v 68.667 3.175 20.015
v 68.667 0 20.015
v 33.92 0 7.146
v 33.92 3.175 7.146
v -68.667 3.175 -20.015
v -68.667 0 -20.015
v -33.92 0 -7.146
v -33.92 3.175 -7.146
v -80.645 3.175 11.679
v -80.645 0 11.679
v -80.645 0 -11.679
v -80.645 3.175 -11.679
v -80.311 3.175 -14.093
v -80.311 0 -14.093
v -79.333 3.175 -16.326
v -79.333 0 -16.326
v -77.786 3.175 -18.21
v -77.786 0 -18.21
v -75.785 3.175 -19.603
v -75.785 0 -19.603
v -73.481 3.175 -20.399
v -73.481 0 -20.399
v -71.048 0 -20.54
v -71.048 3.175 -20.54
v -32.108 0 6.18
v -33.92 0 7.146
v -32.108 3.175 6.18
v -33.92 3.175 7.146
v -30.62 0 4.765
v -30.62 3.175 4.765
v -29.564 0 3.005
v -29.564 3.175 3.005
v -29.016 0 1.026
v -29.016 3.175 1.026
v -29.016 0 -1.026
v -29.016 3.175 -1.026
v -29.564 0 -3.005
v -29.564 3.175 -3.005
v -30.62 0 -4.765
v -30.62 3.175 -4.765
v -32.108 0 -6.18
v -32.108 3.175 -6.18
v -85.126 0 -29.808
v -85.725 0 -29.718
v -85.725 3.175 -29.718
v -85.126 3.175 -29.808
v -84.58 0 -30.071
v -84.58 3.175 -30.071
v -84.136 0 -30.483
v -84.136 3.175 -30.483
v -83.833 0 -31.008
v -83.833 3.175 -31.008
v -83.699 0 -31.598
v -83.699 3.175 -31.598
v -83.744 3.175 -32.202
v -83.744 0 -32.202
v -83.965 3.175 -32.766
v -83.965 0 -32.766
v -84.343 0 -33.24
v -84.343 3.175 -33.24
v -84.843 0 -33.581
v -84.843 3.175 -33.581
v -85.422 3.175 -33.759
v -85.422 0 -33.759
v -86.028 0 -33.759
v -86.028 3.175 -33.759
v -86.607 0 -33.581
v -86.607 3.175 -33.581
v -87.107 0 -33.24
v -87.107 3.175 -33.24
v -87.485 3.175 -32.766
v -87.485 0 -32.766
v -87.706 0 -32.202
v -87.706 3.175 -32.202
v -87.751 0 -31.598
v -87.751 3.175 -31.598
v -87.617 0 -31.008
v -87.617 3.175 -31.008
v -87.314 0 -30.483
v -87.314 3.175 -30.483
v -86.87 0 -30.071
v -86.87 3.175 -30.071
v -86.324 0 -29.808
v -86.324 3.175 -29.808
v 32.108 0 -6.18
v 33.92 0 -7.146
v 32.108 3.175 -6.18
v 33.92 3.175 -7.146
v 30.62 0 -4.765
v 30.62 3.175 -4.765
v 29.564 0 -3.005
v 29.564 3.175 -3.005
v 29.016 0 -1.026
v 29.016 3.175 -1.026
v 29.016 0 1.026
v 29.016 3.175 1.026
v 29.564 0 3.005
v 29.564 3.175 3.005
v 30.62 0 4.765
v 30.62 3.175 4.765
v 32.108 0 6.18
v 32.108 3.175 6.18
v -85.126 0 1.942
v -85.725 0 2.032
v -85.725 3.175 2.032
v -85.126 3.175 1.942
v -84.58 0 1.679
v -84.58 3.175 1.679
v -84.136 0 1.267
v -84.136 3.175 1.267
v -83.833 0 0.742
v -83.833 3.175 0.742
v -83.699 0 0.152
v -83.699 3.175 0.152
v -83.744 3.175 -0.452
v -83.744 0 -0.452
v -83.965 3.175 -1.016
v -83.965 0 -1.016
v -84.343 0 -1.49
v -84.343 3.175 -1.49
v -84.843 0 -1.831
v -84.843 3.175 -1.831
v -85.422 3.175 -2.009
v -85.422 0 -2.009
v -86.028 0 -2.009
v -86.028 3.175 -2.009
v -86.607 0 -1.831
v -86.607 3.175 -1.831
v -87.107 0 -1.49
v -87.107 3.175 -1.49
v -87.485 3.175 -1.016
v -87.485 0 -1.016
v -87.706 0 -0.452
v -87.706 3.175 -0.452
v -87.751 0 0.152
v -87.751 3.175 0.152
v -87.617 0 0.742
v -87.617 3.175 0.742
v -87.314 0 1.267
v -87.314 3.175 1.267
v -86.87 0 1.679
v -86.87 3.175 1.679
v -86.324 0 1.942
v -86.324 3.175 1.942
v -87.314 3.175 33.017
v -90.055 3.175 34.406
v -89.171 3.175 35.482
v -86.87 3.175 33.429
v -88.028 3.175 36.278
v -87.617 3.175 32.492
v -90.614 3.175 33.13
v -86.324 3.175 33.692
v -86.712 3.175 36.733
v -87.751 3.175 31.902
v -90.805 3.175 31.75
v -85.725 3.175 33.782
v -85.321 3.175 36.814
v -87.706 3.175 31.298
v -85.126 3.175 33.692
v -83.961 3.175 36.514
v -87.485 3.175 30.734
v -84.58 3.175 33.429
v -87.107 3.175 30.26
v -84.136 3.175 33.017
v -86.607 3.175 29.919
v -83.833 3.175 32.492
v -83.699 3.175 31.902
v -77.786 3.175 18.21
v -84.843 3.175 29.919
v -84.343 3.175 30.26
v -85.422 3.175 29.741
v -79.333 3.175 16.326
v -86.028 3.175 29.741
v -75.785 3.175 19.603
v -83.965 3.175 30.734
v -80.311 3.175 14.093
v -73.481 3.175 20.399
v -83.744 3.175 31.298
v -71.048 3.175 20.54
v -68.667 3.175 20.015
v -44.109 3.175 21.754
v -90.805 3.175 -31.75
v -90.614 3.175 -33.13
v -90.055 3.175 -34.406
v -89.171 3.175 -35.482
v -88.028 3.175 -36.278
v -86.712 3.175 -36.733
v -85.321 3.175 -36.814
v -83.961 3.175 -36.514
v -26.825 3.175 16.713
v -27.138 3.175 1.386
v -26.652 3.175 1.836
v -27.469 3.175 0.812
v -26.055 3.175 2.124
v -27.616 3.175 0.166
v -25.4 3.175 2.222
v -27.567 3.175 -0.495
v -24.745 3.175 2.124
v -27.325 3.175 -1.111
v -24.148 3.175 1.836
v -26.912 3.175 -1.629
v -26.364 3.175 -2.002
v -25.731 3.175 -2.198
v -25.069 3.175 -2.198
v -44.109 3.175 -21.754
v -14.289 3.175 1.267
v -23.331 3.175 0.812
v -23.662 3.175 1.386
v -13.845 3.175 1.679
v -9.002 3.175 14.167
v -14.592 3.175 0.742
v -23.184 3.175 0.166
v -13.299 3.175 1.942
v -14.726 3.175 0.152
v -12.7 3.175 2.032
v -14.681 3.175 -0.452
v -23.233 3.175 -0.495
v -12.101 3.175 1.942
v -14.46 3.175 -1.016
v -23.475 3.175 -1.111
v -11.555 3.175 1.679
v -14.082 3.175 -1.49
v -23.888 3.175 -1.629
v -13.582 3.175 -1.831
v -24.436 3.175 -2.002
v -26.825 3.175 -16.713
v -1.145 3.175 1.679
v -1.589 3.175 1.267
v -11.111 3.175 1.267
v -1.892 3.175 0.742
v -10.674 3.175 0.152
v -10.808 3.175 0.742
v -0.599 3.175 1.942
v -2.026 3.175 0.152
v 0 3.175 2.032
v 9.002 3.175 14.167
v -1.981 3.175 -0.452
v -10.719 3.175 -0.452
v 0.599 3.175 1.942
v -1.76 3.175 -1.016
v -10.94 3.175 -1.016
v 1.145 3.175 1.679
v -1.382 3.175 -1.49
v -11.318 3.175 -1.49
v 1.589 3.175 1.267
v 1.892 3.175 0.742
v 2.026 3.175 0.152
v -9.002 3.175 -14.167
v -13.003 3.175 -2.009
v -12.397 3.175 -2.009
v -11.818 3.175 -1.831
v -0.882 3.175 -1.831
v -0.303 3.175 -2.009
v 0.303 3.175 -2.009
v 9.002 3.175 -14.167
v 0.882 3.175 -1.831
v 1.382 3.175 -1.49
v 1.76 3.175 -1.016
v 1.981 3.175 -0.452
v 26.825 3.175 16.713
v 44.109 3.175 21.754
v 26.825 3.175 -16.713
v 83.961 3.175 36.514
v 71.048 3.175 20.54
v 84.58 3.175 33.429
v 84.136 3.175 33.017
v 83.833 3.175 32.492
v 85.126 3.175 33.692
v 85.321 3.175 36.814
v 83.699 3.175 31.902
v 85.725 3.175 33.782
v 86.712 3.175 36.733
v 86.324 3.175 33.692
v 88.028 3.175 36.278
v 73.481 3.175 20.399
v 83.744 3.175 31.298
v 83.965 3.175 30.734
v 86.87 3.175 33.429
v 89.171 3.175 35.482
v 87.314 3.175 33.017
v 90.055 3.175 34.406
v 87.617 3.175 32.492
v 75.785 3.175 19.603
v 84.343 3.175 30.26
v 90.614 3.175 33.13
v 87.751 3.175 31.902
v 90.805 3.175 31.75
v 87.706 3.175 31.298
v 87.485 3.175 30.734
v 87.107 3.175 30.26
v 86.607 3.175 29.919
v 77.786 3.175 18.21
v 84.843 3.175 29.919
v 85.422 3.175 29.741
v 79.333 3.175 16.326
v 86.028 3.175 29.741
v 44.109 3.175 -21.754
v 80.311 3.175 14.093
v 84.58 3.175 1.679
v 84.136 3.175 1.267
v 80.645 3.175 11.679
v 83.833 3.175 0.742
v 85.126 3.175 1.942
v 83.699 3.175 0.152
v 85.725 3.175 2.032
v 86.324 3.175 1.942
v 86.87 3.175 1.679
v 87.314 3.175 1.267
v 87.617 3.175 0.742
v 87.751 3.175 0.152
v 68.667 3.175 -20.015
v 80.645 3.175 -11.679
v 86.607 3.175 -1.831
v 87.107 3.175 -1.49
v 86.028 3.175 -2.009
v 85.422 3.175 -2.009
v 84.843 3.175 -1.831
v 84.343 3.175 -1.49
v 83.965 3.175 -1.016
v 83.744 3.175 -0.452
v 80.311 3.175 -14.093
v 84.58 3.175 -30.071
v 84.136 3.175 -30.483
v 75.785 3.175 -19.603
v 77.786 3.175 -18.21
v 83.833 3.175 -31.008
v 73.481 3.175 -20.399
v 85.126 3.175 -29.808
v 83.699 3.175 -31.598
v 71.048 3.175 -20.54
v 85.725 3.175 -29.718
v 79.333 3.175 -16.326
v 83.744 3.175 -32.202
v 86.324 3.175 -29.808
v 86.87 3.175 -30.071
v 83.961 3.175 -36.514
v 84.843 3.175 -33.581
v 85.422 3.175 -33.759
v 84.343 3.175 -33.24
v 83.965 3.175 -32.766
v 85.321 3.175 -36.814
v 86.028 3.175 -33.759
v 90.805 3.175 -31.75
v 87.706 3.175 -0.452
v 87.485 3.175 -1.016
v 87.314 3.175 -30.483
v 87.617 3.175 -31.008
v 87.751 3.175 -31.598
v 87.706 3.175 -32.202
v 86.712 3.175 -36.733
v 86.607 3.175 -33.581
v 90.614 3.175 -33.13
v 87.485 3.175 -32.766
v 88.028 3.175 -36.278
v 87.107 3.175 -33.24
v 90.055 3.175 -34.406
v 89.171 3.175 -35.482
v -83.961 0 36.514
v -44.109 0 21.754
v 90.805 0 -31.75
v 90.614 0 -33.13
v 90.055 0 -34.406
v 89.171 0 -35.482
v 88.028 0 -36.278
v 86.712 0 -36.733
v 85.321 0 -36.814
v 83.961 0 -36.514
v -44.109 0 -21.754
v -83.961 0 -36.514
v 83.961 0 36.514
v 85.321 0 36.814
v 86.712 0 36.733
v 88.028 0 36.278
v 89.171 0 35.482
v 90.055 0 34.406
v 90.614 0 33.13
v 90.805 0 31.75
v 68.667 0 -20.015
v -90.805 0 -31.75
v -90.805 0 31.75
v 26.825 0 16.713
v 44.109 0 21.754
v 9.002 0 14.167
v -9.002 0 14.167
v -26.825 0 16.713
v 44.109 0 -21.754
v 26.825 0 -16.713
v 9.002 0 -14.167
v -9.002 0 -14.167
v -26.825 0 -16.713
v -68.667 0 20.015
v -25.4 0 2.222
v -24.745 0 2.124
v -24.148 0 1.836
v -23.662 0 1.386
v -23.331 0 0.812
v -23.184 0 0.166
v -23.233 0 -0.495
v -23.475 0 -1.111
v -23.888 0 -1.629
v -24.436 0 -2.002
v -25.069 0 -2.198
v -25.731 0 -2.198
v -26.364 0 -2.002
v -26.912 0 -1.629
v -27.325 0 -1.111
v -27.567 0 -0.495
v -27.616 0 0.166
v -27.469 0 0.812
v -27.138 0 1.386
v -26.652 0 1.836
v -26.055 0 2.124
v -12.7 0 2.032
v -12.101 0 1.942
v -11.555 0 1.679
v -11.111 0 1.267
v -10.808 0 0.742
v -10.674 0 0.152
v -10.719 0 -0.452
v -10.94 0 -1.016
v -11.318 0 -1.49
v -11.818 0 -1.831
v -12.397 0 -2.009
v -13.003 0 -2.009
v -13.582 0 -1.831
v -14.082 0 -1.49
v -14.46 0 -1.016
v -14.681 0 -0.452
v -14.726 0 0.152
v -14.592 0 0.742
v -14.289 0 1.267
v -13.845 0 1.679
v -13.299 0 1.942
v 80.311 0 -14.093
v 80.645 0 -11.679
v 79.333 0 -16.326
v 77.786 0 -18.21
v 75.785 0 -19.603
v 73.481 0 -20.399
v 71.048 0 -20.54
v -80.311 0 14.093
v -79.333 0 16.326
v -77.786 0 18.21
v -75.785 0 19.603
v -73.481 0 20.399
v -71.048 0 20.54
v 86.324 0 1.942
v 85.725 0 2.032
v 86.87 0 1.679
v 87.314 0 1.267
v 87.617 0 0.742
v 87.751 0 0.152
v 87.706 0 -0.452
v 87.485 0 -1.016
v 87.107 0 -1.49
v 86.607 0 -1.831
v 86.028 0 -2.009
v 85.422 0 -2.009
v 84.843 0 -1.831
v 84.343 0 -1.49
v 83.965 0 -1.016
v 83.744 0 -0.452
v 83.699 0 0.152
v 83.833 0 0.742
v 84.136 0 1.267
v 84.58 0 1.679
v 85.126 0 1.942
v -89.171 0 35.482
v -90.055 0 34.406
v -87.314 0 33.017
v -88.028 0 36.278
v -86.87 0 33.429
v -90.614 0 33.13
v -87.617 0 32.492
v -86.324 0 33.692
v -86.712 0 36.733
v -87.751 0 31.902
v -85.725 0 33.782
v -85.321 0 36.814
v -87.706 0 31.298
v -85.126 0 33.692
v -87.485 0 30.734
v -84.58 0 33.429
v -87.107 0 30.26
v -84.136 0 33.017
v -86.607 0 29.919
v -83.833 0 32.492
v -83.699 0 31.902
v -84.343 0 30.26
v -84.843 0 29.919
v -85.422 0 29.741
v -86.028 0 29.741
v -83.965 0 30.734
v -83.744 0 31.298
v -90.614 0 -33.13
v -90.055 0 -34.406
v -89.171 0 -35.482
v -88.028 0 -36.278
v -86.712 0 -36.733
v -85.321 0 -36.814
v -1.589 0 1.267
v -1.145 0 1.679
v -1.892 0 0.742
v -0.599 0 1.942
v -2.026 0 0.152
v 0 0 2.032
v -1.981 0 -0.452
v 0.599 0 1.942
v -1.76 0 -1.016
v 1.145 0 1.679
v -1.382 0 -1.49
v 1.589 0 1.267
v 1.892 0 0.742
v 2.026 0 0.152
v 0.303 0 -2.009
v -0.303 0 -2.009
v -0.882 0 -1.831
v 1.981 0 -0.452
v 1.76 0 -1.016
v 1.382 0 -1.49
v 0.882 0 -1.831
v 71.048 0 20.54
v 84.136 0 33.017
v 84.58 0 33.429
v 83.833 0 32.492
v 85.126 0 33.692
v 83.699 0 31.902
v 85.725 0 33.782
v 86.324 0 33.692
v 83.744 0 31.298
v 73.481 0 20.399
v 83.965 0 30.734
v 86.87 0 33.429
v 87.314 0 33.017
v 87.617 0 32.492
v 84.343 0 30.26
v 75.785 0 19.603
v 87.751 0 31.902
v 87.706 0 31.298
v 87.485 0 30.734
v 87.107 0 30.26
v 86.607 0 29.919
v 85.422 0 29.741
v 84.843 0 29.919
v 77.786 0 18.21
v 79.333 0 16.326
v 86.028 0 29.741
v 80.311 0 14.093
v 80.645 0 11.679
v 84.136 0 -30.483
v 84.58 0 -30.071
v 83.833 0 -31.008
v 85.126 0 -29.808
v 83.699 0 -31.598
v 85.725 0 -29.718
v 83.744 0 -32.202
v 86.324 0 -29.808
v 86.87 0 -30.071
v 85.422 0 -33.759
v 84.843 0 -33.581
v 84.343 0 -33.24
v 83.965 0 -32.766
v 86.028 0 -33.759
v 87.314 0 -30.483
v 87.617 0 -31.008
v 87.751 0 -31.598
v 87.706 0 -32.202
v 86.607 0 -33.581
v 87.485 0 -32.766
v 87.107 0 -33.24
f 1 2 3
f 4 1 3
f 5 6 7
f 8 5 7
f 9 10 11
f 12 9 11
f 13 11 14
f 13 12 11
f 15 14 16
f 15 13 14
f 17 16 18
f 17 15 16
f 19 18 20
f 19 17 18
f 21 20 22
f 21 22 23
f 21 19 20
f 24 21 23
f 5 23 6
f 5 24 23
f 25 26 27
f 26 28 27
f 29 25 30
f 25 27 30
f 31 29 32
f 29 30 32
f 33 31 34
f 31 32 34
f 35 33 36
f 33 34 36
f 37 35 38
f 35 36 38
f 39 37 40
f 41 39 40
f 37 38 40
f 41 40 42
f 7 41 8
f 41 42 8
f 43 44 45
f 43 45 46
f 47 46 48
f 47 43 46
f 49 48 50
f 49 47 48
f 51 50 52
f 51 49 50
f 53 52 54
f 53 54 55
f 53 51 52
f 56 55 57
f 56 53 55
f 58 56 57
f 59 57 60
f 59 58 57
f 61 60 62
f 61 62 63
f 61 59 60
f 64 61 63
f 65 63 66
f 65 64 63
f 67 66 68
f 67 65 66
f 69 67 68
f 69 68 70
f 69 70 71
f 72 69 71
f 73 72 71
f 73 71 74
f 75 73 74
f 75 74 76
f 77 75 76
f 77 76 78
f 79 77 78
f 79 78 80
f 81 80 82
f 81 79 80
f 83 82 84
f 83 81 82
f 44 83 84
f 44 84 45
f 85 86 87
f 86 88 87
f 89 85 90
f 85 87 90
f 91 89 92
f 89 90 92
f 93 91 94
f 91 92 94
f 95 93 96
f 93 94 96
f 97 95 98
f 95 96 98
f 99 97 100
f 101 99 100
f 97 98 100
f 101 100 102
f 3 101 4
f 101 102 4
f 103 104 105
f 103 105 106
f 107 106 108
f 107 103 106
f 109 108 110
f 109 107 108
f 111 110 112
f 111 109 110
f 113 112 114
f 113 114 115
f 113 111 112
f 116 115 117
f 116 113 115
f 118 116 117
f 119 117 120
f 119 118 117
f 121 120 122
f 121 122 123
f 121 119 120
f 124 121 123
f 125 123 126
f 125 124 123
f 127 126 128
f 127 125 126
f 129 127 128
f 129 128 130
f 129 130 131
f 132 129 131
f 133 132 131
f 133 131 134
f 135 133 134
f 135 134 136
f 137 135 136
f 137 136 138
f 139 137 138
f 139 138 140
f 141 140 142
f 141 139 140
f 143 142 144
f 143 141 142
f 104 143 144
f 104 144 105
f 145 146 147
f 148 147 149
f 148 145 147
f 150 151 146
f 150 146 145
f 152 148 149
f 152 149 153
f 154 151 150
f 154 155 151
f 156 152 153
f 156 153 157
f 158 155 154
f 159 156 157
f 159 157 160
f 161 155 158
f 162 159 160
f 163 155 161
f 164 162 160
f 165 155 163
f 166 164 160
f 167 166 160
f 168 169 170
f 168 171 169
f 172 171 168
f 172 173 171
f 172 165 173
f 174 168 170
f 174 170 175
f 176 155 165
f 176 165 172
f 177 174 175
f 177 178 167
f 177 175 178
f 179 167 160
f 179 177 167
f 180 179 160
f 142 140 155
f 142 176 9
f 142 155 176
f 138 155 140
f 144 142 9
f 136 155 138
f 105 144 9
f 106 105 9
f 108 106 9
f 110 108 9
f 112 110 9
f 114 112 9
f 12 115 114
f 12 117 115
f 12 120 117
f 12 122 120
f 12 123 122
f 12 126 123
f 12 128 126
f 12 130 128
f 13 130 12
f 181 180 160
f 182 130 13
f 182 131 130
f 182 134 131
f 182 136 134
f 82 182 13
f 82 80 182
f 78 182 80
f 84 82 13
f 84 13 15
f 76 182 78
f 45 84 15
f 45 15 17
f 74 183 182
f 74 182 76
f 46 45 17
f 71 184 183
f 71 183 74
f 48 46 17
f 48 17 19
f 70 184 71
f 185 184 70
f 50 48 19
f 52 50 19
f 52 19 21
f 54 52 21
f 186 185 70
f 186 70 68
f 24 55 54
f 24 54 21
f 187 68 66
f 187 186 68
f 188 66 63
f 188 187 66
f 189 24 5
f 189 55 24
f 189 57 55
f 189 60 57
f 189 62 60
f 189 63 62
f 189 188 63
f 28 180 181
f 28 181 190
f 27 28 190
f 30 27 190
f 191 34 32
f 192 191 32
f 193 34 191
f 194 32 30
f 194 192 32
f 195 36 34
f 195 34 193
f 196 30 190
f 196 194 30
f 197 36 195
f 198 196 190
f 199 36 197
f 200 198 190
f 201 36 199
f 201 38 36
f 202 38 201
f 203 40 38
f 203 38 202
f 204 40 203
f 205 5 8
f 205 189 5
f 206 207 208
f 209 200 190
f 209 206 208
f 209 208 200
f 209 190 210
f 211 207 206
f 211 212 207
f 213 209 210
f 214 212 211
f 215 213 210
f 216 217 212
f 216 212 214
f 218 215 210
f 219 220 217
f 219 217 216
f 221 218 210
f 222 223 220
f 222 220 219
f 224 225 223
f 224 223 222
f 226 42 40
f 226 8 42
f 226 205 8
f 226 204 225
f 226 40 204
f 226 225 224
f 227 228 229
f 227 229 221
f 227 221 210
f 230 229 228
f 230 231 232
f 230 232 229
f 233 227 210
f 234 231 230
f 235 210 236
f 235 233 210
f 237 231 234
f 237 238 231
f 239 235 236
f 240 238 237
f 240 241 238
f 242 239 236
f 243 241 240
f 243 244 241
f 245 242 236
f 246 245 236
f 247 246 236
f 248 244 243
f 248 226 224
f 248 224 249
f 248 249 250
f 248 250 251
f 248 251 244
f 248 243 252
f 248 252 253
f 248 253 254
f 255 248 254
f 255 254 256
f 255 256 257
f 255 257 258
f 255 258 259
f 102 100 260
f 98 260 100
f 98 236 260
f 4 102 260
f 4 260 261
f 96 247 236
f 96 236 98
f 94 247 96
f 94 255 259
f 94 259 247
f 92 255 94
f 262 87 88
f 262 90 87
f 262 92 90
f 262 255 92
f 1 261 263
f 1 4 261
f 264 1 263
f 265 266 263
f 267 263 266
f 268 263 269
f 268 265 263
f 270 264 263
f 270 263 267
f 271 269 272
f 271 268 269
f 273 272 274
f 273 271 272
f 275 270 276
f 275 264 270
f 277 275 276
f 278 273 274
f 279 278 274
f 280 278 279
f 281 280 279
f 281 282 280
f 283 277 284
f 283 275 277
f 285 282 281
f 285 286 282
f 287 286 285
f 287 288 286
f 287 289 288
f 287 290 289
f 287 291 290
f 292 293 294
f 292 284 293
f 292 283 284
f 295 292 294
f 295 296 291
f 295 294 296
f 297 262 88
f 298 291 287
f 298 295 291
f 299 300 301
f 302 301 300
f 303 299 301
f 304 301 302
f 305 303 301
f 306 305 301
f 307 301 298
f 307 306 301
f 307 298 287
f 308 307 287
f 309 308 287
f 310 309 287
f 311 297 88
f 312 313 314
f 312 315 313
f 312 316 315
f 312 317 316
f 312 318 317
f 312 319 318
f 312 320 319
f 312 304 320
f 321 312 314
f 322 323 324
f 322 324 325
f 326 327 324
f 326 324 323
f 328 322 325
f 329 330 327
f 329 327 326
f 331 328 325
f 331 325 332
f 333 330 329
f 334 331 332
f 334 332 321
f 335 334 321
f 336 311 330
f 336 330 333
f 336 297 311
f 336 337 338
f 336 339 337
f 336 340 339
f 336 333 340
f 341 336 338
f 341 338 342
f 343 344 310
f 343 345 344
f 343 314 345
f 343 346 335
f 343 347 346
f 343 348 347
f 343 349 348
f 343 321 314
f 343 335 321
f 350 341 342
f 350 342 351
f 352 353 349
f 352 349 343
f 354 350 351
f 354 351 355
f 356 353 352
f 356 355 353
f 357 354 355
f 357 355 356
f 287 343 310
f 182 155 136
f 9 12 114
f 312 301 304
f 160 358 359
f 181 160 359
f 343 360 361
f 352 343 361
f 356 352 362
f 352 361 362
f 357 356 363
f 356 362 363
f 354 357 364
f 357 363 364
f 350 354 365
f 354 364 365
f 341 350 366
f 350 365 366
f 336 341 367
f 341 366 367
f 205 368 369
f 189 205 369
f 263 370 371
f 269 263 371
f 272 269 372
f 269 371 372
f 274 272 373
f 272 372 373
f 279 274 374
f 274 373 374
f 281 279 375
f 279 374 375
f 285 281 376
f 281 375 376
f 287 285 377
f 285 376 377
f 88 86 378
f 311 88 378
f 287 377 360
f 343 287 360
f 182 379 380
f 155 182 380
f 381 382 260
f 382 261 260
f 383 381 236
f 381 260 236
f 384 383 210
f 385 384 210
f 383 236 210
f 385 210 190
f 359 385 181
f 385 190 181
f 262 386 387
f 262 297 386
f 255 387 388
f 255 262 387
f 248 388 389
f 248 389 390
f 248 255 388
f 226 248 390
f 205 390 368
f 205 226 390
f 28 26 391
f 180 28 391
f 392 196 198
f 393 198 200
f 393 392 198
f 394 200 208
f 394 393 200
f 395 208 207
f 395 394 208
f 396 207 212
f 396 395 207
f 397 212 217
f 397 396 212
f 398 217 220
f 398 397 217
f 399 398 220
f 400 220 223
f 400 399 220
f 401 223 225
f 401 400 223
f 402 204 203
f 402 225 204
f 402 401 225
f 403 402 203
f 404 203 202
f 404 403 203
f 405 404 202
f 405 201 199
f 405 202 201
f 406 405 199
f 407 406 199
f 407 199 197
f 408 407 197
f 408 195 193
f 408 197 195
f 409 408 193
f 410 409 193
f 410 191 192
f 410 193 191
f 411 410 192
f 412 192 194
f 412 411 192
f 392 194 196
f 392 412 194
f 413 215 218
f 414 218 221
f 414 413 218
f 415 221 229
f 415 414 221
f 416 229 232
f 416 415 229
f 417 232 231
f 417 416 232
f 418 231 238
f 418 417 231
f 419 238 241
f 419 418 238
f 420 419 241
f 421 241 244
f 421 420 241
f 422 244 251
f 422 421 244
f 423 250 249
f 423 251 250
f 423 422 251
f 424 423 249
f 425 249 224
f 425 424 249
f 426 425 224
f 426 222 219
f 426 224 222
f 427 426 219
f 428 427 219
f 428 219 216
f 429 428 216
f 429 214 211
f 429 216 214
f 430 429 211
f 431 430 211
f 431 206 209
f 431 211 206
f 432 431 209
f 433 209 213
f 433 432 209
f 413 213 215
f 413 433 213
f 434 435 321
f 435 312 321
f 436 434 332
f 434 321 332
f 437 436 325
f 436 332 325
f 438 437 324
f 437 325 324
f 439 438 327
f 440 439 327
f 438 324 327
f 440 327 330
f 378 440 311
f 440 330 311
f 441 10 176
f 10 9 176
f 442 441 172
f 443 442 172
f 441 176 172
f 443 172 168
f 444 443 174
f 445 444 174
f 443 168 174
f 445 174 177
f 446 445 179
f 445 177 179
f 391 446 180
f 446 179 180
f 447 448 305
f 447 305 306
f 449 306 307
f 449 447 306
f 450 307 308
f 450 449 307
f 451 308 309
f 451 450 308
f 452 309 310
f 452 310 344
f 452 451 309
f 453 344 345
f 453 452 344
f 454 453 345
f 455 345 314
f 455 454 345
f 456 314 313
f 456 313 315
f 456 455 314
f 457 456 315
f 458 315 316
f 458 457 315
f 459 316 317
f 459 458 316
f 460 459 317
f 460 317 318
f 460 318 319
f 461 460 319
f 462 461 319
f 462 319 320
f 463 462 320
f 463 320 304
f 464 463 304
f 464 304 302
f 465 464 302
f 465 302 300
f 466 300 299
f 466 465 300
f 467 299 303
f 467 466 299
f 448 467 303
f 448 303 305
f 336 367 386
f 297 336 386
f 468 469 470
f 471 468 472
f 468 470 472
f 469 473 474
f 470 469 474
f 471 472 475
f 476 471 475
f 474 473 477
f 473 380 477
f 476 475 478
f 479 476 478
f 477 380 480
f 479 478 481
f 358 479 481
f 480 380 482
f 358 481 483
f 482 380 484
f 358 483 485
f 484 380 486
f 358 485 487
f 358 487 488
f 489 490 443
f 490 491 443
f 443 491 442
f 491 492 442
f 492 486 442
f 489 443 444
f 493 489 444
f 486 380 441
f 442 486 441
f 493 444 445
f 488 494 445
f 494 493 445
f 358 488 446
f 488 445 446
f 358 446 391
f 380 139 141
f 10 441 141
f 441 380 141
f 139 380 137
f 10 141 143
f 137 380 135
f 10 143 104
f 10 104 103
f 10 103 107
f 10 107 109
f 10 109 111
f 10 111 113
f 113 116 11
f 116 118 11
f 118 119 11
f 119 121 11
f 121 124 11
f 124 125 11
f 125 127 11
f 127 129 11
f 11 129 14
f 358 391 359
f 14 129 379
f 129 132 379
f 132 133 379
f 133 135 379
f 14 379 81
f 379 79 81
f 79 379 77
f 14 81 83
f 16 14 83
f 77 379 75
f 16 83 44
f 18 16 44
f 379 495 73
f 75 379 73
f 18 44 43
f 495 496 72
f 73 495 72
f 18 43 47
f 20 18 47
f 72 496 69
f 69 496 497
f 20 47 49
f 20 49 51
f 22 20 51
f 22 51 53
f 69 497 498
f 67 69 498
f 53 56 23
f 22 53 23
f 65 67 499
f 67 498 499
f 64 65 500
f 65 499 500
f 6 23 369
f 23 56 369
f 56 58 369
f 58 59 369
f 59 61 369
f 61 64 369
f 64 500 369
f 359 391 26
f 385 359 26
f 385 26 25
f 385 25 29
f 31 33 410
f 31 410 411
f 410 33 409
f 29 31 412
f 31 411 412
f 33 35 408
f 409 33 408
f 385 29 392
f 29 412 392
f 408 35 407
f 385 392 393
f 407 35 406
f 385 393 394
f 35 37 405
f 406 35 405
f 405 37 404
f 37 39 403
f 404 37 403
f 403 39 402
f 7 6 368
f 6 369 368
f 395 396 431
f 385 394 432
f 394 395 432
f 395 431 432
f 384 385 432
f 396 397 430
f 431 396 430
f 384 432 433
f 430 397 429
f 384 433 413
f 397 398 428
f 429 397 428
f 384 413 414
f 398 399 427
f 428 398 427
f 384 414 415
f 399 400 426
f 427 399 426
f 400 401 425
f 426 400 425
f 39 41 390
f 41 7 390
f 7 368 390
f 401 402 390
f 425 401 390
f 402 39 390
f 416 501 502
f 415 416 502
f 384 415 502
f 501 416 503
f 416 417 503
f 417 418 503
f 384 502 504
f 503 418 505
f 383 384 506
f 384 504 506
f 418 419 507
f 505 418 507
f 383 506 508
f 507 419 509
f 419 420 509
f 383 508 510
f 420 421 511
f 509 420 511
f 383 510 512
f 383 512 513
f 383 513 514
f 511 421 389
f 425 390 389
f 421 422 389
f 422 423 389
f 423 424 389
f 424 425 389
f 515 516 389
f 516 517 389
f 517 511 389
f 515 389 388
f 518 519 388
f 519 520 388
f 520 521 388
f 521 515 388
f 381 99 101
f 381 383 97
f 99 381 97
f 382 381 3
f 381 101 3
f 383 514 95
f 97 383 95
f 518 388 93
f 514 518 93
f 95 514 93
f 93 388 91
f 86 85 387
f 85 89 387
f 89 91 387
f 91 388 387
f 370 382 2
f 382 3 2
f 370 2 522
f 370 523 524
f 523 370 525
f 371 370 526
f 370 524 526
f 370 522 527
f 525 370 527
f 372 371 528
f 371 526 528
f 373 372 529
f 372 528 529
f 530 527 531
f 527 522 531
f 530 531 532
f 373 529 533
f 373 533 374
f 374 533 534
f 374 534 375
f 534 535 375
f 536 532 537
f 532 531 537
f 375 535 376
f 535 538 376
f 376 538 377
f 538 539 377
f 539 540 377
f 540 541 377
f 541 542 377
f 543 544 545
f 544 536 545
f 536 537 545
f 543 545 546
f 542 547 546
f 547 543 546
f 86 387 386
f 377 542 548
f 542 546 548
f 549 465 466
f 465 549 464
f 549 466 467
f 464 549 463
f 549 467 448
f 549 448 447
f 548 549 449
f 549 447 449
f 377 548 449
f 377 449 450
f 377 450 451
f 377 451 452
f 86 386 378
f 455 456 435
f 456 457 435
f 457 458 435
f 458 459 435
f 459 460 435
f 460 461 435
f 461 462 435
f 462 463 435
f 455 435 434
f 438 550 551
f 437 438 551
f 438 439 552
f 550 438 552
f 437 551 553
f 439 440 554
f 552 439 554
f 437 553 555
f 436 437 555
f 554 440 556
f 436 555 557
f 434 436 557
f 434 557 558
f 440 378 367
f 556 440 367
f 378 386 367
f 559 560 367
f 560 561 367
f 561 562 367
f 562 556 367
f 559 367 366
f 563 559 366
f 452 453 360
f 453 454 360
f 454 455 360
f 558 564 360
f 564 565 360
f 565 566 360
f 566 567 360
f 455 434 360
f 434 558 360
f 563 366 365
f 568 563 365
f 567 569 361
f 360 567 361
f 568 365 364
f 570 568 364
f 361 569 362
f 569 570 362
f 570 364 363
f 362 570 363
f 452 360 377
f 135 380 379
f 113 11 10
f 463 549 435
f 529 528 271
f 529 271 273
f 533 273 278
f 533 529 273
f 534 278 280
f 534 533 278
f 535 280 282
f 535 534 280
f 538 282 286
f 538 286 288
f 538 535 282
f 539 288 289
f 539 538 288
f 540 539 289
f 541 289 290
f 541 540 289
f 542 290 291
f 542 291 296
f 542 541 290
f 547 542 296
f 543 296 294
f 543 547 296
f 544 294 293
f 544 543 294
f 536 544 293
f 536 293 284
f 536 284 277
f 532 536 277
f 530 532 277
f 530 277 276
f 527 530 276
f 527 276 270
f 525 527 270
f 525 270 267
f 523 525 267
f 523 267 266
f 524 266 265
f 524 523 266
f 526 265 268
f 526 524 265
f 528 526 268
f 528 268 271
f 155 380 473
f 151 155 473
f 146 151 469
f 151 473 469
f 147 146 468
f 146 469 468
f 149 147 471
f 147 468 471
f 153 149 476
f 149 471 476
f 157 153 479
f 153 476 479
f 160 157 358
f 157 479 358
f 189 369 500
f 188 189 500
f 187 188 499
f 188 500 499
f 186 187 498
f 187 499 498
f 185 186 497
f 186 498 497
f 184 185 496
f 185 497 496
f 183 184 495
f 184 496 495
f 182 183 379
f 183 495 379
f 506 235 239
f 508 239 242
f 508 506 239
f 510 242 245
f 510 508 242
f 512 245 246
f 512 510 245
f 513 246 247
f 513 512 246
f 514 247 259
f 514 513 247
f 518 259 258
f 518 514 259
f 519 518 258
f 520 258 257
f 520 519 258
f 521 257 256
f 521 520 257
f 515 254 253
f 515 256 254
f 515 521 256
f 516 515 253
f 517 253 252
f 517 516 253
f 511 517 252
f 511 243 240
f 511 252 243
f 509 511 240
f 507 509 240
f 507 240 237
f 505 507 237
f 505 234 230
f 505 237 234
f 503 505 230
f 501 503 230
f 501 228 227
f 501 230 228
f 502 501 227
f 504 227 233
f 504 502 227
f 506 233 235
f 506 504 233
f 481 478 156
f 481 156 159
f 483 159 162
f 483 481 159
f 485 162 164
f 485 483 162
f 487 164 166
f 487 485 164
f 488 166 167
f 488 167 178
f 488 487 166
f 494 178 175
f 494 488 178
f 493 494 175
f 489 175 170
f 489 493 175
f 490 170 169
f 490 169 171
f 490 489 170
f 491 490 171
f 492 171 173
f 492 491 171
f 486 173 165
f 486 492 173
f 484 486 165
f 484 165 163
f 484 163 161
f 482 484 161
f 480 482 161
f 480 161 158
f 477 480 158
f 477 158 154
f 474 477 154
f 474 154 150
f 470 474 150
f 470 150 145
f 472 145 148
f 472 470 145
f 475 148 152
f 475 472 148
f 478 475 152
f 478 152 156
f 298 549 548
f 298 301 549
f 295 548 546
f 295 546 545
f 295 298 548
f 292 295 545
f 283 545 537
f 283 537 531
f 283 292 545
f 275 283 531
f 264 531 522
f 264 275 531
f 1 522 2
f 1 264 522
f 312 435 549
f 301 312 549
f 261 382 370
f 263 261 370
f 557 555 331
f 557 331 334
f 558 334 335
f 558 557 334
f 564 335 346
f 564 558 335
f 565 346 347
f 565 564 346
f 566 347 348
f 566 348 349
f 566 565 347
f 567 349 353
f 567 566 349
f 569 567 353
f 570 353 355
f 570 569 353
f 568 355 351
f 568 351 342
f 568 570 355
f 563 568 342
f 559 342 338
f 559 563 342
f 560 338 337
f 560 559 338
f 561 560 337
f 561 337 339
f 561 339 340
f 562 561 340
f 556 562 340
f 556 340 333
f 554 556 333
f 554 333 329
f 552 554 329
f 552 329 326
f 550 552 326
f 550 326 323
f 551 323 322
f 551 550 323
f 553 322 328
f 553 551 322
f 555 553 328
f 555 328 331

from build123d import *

# Parameters (mm, degrees)
SKETCH1_R           = 2.032
BOSS_EXTRUDE1_DEPTH = 3.175
FILLET1_R           = 8.89
FILLET2_R           = 7.62
FILLET3_R           = 127
SKETCH1_3_R         = 2.032
SKETCH1_3_R_2       = 2.2225
CUT_EXTRUDE1_DEPTH  = 99.041203328


with BuildPart() as part:
    # Sketch1 → Boss-Extrude1 (new body)
    with BuildSketch(Plane(origin=(0, 0, 0), x_dir=(1, 0, 0), z_dir=(0, 1, 0))):
        with BuildLine():
            Line((90.805, -31.75), (90.805, 31.75))
            ThreePointArc((90.805, 31.75), (88.627022296, 35.919492367), (83.960643072, 36.513763704))
            Line((83.960643072, 36.513763704), (0, 5.417229233))
            Line((0, 5.417229233), (-83.960643072, 36.513763704))
            ThreePointArc((-83.960643072, 36.513763704), (-88.627022296, 35.919492367), (-90.805, 31.75))
            Line((-90.805, 31.75), (-90.805, -31.75))
            ThreePointArc((-90.805, -31.75), (-88.627022296, -35.919492367), (-83.960643072, -36.513763704))
            Line((-83.960643072, -36.513763704), (0, -5.417229233))
            Line((0, -5.417229233), (83.960643072, -36.513763704))
            ThreePointArc((83.960643072, -36.513763704), (88.627022296, -35.919492367), (90.805, -31.75))
        make_face()
        Polygon((80.645, 24.451289285), (80.645, -24.451289285), (14.62651893, 0), align=None, mode=Mode.SUBTRACT)
        with Locations((85.725, 0)):
            Circle(SKETCH1_R, mode=Mode.SUBTRACT)
        with Locations((85.725, 31.75)):
            Circle(SKETCH1_R, mode=Mode.SUBTRACT)
        with Locations((85.725, -31.75)):
            Circle(SKETCH1_R, mode=Mode.SUBTRACT)
        Polygon((-80.645, -24.451289285), (-80.645, 24.451289285), (-14.62651893, 0), align=None, mode=Mode.SUBTRACT)
        with Locations((-85.725, -31.75)):
            Circle(SKETCH1_R, mode=Mode.SUBTRACT)
        with Locations((-85.725, 31.75)):
            Circle(SKETCH1_R, mode=Mode.SUBTRACT)
        with Locations((-85.725, 0)):
            Circle(SKETCH1_R, mode=Mode.SUBTRACT)
    extrude(amount=BOSS_EXTRUDE1_DEPTH)

    # Fillet1
    fillet1_edges = [part.edges().sort_by_distance(p)[0] for p in [
        (-80.645, 1.5875, 24.451289285),
        (-80.645, 1.5875, -24.451289285),
        (80.645, 1.5875, 24.451289285),
        (80.645, 1.5875, -24.451289285),
    ]]
    fillet(fillet1_edges, radius=FILLET1_R)

    # Fillet2
    fillet2_edges = [part.edges().sort_by_distance(p)[0] for p in [
        (14.62651893, 1.5875, 0),
        (-14.62651893, 1.5875, 0),
    ]]
    fillet(fillet2_edges, radius=FILLET2_R)

    # Fillet3
    fillet3_edges = [part.edges().sort_by_distance(p)[0] for p in [
        (0, 1.5875, 5.417229233),
        (0, 1.5875, -5.417229233),
    ]]
    fillet(fillet3_edges, radius=FILLET3_R)

    # Sketch1<3> → Cut-Extrude1 (cut, through all)
    with BuildSketch(Plane(origin=(0, 0, 0), x_dir=(1, 0, 0), z_dir=(0, 1, 0))):
        Circle(SKETCH1_3_R)
        with Locations((-12.7, 0)):
            Circle(SKETCH1_3_R)
        with Locations((-25.4, 0)):
            Circle(SKETCH1_3_R_2)
    extrude(amount=CUT_EXTRUDE1_DEPTH, mode=Mode.SUBTRACT)


solid = part.part
